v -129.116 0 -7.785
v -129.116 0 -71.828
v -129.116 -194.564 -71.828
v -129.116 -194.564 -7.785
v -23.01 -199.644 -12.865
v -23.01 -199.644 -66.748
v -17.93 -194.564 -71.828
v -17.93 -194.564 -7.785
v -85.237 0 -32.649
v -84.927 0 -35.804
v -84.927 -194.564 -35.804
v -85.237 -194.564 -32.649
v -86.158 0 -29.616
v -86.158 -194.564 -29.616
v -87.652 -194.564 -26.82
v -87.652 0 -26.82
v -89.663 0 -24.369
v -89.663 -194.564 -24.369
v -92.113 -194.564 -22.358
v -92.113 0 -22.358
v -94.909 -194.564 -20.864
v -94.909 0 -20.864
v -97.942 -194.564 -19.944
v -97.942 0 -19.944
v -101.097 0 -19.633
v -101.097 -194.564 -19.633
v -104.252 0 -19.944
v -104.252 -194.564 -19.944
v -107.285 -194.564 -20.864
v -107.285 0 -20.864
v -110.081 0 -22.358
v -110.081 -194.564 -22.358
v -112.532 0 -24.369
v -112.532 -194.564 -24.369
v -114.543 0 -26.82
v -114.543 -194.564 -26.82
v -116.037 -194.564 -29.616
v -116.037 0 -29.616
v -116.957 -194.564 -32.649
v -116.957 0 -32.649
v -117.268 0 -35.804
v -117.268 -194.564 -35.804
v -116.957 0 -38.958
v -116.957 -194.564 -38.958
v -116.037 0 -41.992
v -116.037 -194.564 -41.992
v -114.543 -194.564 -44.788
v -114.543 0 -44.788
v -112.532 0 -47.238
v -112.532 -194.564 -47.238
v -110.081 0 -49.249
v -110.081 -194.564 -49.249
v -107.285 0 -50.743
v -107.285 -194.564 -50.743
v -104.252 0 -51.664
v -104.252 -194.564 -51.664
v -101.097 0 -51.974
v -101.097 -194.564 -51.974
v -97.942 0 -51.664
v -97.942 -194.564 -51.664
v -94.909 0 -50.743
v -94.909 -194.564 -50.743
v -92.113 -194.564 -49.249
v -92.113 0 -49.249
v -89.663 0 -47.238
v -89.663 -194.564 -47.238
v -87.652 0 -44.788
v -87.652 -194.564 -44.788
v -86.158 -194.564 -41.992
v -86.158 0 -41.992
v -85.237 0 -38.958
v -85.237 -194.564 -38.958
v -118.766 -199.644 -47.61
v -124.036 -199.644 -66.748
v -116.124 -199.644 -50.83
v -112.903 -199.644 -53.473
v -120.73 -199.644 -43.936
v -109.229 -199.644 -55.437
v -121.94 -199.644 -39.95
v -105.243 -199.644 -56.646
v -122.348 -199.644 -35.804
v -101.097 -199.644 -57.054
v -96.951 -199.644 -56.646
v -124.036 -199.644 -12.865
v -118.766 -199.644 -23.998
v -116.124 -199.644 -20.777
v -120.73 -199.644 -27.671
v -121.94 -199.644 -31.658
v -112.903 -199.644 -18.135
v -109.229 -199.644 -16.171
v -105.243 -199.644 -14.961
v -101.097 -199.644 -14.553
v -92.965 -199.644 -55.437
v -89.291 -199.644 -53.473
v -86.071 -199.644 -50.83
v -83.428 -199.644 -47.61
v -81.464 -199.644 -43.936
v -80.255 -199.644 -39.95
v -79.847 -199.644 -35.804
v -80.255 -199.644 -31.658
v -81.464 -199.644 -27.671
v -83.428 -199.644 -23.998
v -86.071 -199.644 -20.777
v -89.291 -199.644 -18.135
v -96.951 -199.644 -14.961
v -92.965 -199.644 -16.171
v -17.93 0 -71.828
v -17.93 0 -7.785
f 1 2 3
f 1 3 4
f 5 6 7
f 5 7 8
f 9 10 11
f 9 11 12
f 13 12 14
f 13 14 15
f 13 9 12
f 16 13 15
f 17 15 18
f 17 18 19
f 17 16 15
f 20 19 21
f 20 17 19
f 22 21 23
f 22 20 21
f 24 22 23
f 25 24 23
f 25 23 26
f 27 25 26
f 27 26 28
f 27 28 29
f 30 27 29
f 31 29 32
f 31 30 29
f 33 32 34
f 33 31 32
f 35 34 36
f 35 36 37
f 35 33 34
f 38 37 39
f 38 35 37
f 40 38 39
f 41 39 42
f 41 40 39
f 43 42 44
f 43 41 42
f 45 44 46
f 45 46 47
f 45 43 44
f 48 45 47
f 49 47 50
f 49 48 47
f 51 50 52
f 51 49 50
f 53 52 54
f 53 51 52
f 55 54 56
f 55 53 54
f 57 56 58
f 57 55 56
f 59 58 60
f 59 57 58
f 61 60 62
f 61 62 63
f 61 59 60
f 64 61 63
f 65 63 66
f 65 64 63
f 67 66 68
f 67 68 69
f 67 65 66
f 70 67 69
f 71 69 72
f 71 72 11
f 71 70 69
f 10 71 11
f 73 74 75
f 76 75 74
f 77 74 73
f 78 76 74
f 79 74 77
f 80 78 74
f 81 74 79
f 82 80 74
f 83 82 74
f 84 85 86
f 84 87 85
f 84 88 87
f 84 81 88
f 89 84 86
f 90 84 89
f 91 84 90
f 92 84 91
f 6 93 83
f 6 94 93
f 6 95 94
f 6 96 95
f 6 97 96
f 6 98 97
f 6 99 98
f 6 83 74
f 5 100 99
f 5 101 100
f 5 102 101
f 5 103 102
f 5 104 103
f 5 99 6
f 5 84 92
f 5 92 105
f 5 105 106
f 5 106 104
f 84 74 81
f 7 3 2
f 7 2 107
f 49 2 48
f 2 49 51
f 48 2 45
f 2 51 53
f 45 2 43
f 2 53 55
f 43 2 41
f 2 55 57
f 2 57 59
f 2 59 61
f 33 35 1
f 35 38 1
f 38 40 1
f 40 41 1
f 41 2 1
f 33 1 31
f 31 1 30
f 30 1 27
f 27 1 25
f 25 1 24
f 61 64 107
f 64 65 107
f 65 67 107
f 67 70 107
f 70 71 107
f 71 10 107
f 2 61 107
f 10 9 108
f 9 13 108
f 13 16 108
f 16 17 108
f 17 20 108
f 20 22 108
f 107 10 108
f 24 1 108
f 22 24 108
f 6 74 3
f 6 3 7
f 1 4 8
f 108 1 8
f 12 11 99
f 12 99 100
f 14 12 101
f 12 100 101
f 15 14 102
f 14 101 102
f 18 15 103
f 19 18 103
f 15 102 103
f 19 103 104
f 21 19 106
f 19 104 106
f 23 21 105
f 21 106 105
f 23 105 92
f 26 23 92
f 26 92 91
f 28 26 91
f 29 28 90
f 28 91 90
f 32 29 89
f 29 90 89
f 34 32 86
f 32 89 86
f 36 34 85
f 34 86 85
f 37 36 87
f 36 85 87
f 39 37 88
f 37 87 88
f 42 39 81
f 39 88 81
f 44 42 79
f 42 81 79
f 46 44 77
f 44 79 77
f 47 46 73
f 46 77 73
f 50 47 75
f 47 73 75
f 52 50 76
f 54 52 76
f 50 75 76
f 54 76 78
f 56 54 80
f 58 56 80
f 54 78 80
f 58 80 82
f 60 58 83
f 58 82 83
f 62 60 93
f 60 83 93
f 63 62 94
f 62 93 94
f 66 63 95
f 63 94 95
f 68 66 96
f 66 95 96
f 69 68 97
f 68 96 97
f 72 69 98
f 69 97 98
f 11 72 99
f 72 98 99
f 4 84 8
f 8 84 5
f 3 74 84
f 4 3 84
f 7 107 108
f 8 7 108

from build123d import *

# Parameters (mm, degrees)
F0_W     = 111.186231
F0_H     = 64.043274
F0_R     = 16.170621
F1_DEPTH = 199.644
F2_SIZE  = 5.08
F3_W     = 101.026231
F3_H     = 53.883274
F3_R     = 21.250621
F4_DEPTH = 127


with BuildPart() as f1:
    # F0 (on Front) → F1 (new body)
    with BuildSketch(Plane.XZ):
        with Locations((-73.523032, -39.80646)):
            Rectangle(F0_W, F0_H)
        with Locations((-101.097219, -35.803754)):
            Circle(F0_R, mode=Mode.SUBTRACT)
    extrude(amount=F1_DEPTH)

    # F2
    f2_edges = [f1.edges().sort_by_distance(p)[0] for p in [
        (-73.523032, -199.644, -7.784823),
        (-129.116148, -199.644, -39.80646),
        (-73.523032, -199.644, -71.828097),
        (-17.929917, -199.644, -39.80646),
        (-117.26784, -199.644, -35.803754),
    ]]
    chamfer(f2_edges, length=F2_SIZE)

    # F3 (on face) → F4 (join)
    with BuildSketch(Plane.XZ.offset(199.644)):
        with BuildLine():
            ThreePointArc((-62.805545, -55.70646), (-63.026238, -55.425729), (-63.238576, -55.138626))
            Line((-63.238576, -55.138626), (-63.238576, -55.70646))
            Line((-63.238576, -55.70646), (-62.805545, -55.70646))
        make_face()
        with BuildLine():
            ThreePointArc((-62.805545, -55.70646), (-53.377099, -60.202052), (-43.948654, -55.70646))
            Line((-43.948654, -55.70646), (-62.805545, -55.70646))
        make_face()
        with Locations((-73.523032, -39.80646)):
            Rectangle(F3_W, F3_H)
        with BuildLine():
            Line((-63.238576, -40.99594), (-63.238576, -25.149755))
            Line((-63.238576, -25.149755), (-40.182158, -25.149755))
            Line((-40.182158, -25.149755), (-40.182158, -55.70646))
            Line((-40.182158, -55.70646), (-43.948654, -55.70646))
            ThreePointArc((-43.948654, -55.70646), (-53.377099, -60.202052), (-62.805545, -55.70646))
            Line((-62.805545, -55.70646), (-63.238576, -55.70646))
            Line((-63.238576, -55.70646), (-63.238576, -55.138626))
            ThreePointArc((-63.238576, -55.138626), (-65.511868, -48.067283), (-63.238576, -40.99594))
        make_face(mode=Mode.SUBTRACT)
        with Locations((-101.097219, -35.803754)):
            Circle(F3_R, mode=Mode.SUBTRACT)
        with BuildLine():
            Line((-40.182158, -25.149755), (-63.238576, -25.149755))
            Line((-63.238576, -25.149755), (-63.238576, -40.99594))
            Line((-63.238576, -40.99594), (-63.238576, -55.138626))
            ThreePointArc((-63.238576, -55.138626), (-63.026238, -55.425729), (-62.805545, -55.70646))
            Line((-62.805545, -55.70646), (-43.948654, -55.70646))
            Line((-43.948654, -55.70646), (-40.182158, -55.70646))
            Line((-40.182158, -55.70646), (-40.182158, -25.149755))
        make_face()
    extrude(amount=-F4_DEPTH)


solid = f1.part
